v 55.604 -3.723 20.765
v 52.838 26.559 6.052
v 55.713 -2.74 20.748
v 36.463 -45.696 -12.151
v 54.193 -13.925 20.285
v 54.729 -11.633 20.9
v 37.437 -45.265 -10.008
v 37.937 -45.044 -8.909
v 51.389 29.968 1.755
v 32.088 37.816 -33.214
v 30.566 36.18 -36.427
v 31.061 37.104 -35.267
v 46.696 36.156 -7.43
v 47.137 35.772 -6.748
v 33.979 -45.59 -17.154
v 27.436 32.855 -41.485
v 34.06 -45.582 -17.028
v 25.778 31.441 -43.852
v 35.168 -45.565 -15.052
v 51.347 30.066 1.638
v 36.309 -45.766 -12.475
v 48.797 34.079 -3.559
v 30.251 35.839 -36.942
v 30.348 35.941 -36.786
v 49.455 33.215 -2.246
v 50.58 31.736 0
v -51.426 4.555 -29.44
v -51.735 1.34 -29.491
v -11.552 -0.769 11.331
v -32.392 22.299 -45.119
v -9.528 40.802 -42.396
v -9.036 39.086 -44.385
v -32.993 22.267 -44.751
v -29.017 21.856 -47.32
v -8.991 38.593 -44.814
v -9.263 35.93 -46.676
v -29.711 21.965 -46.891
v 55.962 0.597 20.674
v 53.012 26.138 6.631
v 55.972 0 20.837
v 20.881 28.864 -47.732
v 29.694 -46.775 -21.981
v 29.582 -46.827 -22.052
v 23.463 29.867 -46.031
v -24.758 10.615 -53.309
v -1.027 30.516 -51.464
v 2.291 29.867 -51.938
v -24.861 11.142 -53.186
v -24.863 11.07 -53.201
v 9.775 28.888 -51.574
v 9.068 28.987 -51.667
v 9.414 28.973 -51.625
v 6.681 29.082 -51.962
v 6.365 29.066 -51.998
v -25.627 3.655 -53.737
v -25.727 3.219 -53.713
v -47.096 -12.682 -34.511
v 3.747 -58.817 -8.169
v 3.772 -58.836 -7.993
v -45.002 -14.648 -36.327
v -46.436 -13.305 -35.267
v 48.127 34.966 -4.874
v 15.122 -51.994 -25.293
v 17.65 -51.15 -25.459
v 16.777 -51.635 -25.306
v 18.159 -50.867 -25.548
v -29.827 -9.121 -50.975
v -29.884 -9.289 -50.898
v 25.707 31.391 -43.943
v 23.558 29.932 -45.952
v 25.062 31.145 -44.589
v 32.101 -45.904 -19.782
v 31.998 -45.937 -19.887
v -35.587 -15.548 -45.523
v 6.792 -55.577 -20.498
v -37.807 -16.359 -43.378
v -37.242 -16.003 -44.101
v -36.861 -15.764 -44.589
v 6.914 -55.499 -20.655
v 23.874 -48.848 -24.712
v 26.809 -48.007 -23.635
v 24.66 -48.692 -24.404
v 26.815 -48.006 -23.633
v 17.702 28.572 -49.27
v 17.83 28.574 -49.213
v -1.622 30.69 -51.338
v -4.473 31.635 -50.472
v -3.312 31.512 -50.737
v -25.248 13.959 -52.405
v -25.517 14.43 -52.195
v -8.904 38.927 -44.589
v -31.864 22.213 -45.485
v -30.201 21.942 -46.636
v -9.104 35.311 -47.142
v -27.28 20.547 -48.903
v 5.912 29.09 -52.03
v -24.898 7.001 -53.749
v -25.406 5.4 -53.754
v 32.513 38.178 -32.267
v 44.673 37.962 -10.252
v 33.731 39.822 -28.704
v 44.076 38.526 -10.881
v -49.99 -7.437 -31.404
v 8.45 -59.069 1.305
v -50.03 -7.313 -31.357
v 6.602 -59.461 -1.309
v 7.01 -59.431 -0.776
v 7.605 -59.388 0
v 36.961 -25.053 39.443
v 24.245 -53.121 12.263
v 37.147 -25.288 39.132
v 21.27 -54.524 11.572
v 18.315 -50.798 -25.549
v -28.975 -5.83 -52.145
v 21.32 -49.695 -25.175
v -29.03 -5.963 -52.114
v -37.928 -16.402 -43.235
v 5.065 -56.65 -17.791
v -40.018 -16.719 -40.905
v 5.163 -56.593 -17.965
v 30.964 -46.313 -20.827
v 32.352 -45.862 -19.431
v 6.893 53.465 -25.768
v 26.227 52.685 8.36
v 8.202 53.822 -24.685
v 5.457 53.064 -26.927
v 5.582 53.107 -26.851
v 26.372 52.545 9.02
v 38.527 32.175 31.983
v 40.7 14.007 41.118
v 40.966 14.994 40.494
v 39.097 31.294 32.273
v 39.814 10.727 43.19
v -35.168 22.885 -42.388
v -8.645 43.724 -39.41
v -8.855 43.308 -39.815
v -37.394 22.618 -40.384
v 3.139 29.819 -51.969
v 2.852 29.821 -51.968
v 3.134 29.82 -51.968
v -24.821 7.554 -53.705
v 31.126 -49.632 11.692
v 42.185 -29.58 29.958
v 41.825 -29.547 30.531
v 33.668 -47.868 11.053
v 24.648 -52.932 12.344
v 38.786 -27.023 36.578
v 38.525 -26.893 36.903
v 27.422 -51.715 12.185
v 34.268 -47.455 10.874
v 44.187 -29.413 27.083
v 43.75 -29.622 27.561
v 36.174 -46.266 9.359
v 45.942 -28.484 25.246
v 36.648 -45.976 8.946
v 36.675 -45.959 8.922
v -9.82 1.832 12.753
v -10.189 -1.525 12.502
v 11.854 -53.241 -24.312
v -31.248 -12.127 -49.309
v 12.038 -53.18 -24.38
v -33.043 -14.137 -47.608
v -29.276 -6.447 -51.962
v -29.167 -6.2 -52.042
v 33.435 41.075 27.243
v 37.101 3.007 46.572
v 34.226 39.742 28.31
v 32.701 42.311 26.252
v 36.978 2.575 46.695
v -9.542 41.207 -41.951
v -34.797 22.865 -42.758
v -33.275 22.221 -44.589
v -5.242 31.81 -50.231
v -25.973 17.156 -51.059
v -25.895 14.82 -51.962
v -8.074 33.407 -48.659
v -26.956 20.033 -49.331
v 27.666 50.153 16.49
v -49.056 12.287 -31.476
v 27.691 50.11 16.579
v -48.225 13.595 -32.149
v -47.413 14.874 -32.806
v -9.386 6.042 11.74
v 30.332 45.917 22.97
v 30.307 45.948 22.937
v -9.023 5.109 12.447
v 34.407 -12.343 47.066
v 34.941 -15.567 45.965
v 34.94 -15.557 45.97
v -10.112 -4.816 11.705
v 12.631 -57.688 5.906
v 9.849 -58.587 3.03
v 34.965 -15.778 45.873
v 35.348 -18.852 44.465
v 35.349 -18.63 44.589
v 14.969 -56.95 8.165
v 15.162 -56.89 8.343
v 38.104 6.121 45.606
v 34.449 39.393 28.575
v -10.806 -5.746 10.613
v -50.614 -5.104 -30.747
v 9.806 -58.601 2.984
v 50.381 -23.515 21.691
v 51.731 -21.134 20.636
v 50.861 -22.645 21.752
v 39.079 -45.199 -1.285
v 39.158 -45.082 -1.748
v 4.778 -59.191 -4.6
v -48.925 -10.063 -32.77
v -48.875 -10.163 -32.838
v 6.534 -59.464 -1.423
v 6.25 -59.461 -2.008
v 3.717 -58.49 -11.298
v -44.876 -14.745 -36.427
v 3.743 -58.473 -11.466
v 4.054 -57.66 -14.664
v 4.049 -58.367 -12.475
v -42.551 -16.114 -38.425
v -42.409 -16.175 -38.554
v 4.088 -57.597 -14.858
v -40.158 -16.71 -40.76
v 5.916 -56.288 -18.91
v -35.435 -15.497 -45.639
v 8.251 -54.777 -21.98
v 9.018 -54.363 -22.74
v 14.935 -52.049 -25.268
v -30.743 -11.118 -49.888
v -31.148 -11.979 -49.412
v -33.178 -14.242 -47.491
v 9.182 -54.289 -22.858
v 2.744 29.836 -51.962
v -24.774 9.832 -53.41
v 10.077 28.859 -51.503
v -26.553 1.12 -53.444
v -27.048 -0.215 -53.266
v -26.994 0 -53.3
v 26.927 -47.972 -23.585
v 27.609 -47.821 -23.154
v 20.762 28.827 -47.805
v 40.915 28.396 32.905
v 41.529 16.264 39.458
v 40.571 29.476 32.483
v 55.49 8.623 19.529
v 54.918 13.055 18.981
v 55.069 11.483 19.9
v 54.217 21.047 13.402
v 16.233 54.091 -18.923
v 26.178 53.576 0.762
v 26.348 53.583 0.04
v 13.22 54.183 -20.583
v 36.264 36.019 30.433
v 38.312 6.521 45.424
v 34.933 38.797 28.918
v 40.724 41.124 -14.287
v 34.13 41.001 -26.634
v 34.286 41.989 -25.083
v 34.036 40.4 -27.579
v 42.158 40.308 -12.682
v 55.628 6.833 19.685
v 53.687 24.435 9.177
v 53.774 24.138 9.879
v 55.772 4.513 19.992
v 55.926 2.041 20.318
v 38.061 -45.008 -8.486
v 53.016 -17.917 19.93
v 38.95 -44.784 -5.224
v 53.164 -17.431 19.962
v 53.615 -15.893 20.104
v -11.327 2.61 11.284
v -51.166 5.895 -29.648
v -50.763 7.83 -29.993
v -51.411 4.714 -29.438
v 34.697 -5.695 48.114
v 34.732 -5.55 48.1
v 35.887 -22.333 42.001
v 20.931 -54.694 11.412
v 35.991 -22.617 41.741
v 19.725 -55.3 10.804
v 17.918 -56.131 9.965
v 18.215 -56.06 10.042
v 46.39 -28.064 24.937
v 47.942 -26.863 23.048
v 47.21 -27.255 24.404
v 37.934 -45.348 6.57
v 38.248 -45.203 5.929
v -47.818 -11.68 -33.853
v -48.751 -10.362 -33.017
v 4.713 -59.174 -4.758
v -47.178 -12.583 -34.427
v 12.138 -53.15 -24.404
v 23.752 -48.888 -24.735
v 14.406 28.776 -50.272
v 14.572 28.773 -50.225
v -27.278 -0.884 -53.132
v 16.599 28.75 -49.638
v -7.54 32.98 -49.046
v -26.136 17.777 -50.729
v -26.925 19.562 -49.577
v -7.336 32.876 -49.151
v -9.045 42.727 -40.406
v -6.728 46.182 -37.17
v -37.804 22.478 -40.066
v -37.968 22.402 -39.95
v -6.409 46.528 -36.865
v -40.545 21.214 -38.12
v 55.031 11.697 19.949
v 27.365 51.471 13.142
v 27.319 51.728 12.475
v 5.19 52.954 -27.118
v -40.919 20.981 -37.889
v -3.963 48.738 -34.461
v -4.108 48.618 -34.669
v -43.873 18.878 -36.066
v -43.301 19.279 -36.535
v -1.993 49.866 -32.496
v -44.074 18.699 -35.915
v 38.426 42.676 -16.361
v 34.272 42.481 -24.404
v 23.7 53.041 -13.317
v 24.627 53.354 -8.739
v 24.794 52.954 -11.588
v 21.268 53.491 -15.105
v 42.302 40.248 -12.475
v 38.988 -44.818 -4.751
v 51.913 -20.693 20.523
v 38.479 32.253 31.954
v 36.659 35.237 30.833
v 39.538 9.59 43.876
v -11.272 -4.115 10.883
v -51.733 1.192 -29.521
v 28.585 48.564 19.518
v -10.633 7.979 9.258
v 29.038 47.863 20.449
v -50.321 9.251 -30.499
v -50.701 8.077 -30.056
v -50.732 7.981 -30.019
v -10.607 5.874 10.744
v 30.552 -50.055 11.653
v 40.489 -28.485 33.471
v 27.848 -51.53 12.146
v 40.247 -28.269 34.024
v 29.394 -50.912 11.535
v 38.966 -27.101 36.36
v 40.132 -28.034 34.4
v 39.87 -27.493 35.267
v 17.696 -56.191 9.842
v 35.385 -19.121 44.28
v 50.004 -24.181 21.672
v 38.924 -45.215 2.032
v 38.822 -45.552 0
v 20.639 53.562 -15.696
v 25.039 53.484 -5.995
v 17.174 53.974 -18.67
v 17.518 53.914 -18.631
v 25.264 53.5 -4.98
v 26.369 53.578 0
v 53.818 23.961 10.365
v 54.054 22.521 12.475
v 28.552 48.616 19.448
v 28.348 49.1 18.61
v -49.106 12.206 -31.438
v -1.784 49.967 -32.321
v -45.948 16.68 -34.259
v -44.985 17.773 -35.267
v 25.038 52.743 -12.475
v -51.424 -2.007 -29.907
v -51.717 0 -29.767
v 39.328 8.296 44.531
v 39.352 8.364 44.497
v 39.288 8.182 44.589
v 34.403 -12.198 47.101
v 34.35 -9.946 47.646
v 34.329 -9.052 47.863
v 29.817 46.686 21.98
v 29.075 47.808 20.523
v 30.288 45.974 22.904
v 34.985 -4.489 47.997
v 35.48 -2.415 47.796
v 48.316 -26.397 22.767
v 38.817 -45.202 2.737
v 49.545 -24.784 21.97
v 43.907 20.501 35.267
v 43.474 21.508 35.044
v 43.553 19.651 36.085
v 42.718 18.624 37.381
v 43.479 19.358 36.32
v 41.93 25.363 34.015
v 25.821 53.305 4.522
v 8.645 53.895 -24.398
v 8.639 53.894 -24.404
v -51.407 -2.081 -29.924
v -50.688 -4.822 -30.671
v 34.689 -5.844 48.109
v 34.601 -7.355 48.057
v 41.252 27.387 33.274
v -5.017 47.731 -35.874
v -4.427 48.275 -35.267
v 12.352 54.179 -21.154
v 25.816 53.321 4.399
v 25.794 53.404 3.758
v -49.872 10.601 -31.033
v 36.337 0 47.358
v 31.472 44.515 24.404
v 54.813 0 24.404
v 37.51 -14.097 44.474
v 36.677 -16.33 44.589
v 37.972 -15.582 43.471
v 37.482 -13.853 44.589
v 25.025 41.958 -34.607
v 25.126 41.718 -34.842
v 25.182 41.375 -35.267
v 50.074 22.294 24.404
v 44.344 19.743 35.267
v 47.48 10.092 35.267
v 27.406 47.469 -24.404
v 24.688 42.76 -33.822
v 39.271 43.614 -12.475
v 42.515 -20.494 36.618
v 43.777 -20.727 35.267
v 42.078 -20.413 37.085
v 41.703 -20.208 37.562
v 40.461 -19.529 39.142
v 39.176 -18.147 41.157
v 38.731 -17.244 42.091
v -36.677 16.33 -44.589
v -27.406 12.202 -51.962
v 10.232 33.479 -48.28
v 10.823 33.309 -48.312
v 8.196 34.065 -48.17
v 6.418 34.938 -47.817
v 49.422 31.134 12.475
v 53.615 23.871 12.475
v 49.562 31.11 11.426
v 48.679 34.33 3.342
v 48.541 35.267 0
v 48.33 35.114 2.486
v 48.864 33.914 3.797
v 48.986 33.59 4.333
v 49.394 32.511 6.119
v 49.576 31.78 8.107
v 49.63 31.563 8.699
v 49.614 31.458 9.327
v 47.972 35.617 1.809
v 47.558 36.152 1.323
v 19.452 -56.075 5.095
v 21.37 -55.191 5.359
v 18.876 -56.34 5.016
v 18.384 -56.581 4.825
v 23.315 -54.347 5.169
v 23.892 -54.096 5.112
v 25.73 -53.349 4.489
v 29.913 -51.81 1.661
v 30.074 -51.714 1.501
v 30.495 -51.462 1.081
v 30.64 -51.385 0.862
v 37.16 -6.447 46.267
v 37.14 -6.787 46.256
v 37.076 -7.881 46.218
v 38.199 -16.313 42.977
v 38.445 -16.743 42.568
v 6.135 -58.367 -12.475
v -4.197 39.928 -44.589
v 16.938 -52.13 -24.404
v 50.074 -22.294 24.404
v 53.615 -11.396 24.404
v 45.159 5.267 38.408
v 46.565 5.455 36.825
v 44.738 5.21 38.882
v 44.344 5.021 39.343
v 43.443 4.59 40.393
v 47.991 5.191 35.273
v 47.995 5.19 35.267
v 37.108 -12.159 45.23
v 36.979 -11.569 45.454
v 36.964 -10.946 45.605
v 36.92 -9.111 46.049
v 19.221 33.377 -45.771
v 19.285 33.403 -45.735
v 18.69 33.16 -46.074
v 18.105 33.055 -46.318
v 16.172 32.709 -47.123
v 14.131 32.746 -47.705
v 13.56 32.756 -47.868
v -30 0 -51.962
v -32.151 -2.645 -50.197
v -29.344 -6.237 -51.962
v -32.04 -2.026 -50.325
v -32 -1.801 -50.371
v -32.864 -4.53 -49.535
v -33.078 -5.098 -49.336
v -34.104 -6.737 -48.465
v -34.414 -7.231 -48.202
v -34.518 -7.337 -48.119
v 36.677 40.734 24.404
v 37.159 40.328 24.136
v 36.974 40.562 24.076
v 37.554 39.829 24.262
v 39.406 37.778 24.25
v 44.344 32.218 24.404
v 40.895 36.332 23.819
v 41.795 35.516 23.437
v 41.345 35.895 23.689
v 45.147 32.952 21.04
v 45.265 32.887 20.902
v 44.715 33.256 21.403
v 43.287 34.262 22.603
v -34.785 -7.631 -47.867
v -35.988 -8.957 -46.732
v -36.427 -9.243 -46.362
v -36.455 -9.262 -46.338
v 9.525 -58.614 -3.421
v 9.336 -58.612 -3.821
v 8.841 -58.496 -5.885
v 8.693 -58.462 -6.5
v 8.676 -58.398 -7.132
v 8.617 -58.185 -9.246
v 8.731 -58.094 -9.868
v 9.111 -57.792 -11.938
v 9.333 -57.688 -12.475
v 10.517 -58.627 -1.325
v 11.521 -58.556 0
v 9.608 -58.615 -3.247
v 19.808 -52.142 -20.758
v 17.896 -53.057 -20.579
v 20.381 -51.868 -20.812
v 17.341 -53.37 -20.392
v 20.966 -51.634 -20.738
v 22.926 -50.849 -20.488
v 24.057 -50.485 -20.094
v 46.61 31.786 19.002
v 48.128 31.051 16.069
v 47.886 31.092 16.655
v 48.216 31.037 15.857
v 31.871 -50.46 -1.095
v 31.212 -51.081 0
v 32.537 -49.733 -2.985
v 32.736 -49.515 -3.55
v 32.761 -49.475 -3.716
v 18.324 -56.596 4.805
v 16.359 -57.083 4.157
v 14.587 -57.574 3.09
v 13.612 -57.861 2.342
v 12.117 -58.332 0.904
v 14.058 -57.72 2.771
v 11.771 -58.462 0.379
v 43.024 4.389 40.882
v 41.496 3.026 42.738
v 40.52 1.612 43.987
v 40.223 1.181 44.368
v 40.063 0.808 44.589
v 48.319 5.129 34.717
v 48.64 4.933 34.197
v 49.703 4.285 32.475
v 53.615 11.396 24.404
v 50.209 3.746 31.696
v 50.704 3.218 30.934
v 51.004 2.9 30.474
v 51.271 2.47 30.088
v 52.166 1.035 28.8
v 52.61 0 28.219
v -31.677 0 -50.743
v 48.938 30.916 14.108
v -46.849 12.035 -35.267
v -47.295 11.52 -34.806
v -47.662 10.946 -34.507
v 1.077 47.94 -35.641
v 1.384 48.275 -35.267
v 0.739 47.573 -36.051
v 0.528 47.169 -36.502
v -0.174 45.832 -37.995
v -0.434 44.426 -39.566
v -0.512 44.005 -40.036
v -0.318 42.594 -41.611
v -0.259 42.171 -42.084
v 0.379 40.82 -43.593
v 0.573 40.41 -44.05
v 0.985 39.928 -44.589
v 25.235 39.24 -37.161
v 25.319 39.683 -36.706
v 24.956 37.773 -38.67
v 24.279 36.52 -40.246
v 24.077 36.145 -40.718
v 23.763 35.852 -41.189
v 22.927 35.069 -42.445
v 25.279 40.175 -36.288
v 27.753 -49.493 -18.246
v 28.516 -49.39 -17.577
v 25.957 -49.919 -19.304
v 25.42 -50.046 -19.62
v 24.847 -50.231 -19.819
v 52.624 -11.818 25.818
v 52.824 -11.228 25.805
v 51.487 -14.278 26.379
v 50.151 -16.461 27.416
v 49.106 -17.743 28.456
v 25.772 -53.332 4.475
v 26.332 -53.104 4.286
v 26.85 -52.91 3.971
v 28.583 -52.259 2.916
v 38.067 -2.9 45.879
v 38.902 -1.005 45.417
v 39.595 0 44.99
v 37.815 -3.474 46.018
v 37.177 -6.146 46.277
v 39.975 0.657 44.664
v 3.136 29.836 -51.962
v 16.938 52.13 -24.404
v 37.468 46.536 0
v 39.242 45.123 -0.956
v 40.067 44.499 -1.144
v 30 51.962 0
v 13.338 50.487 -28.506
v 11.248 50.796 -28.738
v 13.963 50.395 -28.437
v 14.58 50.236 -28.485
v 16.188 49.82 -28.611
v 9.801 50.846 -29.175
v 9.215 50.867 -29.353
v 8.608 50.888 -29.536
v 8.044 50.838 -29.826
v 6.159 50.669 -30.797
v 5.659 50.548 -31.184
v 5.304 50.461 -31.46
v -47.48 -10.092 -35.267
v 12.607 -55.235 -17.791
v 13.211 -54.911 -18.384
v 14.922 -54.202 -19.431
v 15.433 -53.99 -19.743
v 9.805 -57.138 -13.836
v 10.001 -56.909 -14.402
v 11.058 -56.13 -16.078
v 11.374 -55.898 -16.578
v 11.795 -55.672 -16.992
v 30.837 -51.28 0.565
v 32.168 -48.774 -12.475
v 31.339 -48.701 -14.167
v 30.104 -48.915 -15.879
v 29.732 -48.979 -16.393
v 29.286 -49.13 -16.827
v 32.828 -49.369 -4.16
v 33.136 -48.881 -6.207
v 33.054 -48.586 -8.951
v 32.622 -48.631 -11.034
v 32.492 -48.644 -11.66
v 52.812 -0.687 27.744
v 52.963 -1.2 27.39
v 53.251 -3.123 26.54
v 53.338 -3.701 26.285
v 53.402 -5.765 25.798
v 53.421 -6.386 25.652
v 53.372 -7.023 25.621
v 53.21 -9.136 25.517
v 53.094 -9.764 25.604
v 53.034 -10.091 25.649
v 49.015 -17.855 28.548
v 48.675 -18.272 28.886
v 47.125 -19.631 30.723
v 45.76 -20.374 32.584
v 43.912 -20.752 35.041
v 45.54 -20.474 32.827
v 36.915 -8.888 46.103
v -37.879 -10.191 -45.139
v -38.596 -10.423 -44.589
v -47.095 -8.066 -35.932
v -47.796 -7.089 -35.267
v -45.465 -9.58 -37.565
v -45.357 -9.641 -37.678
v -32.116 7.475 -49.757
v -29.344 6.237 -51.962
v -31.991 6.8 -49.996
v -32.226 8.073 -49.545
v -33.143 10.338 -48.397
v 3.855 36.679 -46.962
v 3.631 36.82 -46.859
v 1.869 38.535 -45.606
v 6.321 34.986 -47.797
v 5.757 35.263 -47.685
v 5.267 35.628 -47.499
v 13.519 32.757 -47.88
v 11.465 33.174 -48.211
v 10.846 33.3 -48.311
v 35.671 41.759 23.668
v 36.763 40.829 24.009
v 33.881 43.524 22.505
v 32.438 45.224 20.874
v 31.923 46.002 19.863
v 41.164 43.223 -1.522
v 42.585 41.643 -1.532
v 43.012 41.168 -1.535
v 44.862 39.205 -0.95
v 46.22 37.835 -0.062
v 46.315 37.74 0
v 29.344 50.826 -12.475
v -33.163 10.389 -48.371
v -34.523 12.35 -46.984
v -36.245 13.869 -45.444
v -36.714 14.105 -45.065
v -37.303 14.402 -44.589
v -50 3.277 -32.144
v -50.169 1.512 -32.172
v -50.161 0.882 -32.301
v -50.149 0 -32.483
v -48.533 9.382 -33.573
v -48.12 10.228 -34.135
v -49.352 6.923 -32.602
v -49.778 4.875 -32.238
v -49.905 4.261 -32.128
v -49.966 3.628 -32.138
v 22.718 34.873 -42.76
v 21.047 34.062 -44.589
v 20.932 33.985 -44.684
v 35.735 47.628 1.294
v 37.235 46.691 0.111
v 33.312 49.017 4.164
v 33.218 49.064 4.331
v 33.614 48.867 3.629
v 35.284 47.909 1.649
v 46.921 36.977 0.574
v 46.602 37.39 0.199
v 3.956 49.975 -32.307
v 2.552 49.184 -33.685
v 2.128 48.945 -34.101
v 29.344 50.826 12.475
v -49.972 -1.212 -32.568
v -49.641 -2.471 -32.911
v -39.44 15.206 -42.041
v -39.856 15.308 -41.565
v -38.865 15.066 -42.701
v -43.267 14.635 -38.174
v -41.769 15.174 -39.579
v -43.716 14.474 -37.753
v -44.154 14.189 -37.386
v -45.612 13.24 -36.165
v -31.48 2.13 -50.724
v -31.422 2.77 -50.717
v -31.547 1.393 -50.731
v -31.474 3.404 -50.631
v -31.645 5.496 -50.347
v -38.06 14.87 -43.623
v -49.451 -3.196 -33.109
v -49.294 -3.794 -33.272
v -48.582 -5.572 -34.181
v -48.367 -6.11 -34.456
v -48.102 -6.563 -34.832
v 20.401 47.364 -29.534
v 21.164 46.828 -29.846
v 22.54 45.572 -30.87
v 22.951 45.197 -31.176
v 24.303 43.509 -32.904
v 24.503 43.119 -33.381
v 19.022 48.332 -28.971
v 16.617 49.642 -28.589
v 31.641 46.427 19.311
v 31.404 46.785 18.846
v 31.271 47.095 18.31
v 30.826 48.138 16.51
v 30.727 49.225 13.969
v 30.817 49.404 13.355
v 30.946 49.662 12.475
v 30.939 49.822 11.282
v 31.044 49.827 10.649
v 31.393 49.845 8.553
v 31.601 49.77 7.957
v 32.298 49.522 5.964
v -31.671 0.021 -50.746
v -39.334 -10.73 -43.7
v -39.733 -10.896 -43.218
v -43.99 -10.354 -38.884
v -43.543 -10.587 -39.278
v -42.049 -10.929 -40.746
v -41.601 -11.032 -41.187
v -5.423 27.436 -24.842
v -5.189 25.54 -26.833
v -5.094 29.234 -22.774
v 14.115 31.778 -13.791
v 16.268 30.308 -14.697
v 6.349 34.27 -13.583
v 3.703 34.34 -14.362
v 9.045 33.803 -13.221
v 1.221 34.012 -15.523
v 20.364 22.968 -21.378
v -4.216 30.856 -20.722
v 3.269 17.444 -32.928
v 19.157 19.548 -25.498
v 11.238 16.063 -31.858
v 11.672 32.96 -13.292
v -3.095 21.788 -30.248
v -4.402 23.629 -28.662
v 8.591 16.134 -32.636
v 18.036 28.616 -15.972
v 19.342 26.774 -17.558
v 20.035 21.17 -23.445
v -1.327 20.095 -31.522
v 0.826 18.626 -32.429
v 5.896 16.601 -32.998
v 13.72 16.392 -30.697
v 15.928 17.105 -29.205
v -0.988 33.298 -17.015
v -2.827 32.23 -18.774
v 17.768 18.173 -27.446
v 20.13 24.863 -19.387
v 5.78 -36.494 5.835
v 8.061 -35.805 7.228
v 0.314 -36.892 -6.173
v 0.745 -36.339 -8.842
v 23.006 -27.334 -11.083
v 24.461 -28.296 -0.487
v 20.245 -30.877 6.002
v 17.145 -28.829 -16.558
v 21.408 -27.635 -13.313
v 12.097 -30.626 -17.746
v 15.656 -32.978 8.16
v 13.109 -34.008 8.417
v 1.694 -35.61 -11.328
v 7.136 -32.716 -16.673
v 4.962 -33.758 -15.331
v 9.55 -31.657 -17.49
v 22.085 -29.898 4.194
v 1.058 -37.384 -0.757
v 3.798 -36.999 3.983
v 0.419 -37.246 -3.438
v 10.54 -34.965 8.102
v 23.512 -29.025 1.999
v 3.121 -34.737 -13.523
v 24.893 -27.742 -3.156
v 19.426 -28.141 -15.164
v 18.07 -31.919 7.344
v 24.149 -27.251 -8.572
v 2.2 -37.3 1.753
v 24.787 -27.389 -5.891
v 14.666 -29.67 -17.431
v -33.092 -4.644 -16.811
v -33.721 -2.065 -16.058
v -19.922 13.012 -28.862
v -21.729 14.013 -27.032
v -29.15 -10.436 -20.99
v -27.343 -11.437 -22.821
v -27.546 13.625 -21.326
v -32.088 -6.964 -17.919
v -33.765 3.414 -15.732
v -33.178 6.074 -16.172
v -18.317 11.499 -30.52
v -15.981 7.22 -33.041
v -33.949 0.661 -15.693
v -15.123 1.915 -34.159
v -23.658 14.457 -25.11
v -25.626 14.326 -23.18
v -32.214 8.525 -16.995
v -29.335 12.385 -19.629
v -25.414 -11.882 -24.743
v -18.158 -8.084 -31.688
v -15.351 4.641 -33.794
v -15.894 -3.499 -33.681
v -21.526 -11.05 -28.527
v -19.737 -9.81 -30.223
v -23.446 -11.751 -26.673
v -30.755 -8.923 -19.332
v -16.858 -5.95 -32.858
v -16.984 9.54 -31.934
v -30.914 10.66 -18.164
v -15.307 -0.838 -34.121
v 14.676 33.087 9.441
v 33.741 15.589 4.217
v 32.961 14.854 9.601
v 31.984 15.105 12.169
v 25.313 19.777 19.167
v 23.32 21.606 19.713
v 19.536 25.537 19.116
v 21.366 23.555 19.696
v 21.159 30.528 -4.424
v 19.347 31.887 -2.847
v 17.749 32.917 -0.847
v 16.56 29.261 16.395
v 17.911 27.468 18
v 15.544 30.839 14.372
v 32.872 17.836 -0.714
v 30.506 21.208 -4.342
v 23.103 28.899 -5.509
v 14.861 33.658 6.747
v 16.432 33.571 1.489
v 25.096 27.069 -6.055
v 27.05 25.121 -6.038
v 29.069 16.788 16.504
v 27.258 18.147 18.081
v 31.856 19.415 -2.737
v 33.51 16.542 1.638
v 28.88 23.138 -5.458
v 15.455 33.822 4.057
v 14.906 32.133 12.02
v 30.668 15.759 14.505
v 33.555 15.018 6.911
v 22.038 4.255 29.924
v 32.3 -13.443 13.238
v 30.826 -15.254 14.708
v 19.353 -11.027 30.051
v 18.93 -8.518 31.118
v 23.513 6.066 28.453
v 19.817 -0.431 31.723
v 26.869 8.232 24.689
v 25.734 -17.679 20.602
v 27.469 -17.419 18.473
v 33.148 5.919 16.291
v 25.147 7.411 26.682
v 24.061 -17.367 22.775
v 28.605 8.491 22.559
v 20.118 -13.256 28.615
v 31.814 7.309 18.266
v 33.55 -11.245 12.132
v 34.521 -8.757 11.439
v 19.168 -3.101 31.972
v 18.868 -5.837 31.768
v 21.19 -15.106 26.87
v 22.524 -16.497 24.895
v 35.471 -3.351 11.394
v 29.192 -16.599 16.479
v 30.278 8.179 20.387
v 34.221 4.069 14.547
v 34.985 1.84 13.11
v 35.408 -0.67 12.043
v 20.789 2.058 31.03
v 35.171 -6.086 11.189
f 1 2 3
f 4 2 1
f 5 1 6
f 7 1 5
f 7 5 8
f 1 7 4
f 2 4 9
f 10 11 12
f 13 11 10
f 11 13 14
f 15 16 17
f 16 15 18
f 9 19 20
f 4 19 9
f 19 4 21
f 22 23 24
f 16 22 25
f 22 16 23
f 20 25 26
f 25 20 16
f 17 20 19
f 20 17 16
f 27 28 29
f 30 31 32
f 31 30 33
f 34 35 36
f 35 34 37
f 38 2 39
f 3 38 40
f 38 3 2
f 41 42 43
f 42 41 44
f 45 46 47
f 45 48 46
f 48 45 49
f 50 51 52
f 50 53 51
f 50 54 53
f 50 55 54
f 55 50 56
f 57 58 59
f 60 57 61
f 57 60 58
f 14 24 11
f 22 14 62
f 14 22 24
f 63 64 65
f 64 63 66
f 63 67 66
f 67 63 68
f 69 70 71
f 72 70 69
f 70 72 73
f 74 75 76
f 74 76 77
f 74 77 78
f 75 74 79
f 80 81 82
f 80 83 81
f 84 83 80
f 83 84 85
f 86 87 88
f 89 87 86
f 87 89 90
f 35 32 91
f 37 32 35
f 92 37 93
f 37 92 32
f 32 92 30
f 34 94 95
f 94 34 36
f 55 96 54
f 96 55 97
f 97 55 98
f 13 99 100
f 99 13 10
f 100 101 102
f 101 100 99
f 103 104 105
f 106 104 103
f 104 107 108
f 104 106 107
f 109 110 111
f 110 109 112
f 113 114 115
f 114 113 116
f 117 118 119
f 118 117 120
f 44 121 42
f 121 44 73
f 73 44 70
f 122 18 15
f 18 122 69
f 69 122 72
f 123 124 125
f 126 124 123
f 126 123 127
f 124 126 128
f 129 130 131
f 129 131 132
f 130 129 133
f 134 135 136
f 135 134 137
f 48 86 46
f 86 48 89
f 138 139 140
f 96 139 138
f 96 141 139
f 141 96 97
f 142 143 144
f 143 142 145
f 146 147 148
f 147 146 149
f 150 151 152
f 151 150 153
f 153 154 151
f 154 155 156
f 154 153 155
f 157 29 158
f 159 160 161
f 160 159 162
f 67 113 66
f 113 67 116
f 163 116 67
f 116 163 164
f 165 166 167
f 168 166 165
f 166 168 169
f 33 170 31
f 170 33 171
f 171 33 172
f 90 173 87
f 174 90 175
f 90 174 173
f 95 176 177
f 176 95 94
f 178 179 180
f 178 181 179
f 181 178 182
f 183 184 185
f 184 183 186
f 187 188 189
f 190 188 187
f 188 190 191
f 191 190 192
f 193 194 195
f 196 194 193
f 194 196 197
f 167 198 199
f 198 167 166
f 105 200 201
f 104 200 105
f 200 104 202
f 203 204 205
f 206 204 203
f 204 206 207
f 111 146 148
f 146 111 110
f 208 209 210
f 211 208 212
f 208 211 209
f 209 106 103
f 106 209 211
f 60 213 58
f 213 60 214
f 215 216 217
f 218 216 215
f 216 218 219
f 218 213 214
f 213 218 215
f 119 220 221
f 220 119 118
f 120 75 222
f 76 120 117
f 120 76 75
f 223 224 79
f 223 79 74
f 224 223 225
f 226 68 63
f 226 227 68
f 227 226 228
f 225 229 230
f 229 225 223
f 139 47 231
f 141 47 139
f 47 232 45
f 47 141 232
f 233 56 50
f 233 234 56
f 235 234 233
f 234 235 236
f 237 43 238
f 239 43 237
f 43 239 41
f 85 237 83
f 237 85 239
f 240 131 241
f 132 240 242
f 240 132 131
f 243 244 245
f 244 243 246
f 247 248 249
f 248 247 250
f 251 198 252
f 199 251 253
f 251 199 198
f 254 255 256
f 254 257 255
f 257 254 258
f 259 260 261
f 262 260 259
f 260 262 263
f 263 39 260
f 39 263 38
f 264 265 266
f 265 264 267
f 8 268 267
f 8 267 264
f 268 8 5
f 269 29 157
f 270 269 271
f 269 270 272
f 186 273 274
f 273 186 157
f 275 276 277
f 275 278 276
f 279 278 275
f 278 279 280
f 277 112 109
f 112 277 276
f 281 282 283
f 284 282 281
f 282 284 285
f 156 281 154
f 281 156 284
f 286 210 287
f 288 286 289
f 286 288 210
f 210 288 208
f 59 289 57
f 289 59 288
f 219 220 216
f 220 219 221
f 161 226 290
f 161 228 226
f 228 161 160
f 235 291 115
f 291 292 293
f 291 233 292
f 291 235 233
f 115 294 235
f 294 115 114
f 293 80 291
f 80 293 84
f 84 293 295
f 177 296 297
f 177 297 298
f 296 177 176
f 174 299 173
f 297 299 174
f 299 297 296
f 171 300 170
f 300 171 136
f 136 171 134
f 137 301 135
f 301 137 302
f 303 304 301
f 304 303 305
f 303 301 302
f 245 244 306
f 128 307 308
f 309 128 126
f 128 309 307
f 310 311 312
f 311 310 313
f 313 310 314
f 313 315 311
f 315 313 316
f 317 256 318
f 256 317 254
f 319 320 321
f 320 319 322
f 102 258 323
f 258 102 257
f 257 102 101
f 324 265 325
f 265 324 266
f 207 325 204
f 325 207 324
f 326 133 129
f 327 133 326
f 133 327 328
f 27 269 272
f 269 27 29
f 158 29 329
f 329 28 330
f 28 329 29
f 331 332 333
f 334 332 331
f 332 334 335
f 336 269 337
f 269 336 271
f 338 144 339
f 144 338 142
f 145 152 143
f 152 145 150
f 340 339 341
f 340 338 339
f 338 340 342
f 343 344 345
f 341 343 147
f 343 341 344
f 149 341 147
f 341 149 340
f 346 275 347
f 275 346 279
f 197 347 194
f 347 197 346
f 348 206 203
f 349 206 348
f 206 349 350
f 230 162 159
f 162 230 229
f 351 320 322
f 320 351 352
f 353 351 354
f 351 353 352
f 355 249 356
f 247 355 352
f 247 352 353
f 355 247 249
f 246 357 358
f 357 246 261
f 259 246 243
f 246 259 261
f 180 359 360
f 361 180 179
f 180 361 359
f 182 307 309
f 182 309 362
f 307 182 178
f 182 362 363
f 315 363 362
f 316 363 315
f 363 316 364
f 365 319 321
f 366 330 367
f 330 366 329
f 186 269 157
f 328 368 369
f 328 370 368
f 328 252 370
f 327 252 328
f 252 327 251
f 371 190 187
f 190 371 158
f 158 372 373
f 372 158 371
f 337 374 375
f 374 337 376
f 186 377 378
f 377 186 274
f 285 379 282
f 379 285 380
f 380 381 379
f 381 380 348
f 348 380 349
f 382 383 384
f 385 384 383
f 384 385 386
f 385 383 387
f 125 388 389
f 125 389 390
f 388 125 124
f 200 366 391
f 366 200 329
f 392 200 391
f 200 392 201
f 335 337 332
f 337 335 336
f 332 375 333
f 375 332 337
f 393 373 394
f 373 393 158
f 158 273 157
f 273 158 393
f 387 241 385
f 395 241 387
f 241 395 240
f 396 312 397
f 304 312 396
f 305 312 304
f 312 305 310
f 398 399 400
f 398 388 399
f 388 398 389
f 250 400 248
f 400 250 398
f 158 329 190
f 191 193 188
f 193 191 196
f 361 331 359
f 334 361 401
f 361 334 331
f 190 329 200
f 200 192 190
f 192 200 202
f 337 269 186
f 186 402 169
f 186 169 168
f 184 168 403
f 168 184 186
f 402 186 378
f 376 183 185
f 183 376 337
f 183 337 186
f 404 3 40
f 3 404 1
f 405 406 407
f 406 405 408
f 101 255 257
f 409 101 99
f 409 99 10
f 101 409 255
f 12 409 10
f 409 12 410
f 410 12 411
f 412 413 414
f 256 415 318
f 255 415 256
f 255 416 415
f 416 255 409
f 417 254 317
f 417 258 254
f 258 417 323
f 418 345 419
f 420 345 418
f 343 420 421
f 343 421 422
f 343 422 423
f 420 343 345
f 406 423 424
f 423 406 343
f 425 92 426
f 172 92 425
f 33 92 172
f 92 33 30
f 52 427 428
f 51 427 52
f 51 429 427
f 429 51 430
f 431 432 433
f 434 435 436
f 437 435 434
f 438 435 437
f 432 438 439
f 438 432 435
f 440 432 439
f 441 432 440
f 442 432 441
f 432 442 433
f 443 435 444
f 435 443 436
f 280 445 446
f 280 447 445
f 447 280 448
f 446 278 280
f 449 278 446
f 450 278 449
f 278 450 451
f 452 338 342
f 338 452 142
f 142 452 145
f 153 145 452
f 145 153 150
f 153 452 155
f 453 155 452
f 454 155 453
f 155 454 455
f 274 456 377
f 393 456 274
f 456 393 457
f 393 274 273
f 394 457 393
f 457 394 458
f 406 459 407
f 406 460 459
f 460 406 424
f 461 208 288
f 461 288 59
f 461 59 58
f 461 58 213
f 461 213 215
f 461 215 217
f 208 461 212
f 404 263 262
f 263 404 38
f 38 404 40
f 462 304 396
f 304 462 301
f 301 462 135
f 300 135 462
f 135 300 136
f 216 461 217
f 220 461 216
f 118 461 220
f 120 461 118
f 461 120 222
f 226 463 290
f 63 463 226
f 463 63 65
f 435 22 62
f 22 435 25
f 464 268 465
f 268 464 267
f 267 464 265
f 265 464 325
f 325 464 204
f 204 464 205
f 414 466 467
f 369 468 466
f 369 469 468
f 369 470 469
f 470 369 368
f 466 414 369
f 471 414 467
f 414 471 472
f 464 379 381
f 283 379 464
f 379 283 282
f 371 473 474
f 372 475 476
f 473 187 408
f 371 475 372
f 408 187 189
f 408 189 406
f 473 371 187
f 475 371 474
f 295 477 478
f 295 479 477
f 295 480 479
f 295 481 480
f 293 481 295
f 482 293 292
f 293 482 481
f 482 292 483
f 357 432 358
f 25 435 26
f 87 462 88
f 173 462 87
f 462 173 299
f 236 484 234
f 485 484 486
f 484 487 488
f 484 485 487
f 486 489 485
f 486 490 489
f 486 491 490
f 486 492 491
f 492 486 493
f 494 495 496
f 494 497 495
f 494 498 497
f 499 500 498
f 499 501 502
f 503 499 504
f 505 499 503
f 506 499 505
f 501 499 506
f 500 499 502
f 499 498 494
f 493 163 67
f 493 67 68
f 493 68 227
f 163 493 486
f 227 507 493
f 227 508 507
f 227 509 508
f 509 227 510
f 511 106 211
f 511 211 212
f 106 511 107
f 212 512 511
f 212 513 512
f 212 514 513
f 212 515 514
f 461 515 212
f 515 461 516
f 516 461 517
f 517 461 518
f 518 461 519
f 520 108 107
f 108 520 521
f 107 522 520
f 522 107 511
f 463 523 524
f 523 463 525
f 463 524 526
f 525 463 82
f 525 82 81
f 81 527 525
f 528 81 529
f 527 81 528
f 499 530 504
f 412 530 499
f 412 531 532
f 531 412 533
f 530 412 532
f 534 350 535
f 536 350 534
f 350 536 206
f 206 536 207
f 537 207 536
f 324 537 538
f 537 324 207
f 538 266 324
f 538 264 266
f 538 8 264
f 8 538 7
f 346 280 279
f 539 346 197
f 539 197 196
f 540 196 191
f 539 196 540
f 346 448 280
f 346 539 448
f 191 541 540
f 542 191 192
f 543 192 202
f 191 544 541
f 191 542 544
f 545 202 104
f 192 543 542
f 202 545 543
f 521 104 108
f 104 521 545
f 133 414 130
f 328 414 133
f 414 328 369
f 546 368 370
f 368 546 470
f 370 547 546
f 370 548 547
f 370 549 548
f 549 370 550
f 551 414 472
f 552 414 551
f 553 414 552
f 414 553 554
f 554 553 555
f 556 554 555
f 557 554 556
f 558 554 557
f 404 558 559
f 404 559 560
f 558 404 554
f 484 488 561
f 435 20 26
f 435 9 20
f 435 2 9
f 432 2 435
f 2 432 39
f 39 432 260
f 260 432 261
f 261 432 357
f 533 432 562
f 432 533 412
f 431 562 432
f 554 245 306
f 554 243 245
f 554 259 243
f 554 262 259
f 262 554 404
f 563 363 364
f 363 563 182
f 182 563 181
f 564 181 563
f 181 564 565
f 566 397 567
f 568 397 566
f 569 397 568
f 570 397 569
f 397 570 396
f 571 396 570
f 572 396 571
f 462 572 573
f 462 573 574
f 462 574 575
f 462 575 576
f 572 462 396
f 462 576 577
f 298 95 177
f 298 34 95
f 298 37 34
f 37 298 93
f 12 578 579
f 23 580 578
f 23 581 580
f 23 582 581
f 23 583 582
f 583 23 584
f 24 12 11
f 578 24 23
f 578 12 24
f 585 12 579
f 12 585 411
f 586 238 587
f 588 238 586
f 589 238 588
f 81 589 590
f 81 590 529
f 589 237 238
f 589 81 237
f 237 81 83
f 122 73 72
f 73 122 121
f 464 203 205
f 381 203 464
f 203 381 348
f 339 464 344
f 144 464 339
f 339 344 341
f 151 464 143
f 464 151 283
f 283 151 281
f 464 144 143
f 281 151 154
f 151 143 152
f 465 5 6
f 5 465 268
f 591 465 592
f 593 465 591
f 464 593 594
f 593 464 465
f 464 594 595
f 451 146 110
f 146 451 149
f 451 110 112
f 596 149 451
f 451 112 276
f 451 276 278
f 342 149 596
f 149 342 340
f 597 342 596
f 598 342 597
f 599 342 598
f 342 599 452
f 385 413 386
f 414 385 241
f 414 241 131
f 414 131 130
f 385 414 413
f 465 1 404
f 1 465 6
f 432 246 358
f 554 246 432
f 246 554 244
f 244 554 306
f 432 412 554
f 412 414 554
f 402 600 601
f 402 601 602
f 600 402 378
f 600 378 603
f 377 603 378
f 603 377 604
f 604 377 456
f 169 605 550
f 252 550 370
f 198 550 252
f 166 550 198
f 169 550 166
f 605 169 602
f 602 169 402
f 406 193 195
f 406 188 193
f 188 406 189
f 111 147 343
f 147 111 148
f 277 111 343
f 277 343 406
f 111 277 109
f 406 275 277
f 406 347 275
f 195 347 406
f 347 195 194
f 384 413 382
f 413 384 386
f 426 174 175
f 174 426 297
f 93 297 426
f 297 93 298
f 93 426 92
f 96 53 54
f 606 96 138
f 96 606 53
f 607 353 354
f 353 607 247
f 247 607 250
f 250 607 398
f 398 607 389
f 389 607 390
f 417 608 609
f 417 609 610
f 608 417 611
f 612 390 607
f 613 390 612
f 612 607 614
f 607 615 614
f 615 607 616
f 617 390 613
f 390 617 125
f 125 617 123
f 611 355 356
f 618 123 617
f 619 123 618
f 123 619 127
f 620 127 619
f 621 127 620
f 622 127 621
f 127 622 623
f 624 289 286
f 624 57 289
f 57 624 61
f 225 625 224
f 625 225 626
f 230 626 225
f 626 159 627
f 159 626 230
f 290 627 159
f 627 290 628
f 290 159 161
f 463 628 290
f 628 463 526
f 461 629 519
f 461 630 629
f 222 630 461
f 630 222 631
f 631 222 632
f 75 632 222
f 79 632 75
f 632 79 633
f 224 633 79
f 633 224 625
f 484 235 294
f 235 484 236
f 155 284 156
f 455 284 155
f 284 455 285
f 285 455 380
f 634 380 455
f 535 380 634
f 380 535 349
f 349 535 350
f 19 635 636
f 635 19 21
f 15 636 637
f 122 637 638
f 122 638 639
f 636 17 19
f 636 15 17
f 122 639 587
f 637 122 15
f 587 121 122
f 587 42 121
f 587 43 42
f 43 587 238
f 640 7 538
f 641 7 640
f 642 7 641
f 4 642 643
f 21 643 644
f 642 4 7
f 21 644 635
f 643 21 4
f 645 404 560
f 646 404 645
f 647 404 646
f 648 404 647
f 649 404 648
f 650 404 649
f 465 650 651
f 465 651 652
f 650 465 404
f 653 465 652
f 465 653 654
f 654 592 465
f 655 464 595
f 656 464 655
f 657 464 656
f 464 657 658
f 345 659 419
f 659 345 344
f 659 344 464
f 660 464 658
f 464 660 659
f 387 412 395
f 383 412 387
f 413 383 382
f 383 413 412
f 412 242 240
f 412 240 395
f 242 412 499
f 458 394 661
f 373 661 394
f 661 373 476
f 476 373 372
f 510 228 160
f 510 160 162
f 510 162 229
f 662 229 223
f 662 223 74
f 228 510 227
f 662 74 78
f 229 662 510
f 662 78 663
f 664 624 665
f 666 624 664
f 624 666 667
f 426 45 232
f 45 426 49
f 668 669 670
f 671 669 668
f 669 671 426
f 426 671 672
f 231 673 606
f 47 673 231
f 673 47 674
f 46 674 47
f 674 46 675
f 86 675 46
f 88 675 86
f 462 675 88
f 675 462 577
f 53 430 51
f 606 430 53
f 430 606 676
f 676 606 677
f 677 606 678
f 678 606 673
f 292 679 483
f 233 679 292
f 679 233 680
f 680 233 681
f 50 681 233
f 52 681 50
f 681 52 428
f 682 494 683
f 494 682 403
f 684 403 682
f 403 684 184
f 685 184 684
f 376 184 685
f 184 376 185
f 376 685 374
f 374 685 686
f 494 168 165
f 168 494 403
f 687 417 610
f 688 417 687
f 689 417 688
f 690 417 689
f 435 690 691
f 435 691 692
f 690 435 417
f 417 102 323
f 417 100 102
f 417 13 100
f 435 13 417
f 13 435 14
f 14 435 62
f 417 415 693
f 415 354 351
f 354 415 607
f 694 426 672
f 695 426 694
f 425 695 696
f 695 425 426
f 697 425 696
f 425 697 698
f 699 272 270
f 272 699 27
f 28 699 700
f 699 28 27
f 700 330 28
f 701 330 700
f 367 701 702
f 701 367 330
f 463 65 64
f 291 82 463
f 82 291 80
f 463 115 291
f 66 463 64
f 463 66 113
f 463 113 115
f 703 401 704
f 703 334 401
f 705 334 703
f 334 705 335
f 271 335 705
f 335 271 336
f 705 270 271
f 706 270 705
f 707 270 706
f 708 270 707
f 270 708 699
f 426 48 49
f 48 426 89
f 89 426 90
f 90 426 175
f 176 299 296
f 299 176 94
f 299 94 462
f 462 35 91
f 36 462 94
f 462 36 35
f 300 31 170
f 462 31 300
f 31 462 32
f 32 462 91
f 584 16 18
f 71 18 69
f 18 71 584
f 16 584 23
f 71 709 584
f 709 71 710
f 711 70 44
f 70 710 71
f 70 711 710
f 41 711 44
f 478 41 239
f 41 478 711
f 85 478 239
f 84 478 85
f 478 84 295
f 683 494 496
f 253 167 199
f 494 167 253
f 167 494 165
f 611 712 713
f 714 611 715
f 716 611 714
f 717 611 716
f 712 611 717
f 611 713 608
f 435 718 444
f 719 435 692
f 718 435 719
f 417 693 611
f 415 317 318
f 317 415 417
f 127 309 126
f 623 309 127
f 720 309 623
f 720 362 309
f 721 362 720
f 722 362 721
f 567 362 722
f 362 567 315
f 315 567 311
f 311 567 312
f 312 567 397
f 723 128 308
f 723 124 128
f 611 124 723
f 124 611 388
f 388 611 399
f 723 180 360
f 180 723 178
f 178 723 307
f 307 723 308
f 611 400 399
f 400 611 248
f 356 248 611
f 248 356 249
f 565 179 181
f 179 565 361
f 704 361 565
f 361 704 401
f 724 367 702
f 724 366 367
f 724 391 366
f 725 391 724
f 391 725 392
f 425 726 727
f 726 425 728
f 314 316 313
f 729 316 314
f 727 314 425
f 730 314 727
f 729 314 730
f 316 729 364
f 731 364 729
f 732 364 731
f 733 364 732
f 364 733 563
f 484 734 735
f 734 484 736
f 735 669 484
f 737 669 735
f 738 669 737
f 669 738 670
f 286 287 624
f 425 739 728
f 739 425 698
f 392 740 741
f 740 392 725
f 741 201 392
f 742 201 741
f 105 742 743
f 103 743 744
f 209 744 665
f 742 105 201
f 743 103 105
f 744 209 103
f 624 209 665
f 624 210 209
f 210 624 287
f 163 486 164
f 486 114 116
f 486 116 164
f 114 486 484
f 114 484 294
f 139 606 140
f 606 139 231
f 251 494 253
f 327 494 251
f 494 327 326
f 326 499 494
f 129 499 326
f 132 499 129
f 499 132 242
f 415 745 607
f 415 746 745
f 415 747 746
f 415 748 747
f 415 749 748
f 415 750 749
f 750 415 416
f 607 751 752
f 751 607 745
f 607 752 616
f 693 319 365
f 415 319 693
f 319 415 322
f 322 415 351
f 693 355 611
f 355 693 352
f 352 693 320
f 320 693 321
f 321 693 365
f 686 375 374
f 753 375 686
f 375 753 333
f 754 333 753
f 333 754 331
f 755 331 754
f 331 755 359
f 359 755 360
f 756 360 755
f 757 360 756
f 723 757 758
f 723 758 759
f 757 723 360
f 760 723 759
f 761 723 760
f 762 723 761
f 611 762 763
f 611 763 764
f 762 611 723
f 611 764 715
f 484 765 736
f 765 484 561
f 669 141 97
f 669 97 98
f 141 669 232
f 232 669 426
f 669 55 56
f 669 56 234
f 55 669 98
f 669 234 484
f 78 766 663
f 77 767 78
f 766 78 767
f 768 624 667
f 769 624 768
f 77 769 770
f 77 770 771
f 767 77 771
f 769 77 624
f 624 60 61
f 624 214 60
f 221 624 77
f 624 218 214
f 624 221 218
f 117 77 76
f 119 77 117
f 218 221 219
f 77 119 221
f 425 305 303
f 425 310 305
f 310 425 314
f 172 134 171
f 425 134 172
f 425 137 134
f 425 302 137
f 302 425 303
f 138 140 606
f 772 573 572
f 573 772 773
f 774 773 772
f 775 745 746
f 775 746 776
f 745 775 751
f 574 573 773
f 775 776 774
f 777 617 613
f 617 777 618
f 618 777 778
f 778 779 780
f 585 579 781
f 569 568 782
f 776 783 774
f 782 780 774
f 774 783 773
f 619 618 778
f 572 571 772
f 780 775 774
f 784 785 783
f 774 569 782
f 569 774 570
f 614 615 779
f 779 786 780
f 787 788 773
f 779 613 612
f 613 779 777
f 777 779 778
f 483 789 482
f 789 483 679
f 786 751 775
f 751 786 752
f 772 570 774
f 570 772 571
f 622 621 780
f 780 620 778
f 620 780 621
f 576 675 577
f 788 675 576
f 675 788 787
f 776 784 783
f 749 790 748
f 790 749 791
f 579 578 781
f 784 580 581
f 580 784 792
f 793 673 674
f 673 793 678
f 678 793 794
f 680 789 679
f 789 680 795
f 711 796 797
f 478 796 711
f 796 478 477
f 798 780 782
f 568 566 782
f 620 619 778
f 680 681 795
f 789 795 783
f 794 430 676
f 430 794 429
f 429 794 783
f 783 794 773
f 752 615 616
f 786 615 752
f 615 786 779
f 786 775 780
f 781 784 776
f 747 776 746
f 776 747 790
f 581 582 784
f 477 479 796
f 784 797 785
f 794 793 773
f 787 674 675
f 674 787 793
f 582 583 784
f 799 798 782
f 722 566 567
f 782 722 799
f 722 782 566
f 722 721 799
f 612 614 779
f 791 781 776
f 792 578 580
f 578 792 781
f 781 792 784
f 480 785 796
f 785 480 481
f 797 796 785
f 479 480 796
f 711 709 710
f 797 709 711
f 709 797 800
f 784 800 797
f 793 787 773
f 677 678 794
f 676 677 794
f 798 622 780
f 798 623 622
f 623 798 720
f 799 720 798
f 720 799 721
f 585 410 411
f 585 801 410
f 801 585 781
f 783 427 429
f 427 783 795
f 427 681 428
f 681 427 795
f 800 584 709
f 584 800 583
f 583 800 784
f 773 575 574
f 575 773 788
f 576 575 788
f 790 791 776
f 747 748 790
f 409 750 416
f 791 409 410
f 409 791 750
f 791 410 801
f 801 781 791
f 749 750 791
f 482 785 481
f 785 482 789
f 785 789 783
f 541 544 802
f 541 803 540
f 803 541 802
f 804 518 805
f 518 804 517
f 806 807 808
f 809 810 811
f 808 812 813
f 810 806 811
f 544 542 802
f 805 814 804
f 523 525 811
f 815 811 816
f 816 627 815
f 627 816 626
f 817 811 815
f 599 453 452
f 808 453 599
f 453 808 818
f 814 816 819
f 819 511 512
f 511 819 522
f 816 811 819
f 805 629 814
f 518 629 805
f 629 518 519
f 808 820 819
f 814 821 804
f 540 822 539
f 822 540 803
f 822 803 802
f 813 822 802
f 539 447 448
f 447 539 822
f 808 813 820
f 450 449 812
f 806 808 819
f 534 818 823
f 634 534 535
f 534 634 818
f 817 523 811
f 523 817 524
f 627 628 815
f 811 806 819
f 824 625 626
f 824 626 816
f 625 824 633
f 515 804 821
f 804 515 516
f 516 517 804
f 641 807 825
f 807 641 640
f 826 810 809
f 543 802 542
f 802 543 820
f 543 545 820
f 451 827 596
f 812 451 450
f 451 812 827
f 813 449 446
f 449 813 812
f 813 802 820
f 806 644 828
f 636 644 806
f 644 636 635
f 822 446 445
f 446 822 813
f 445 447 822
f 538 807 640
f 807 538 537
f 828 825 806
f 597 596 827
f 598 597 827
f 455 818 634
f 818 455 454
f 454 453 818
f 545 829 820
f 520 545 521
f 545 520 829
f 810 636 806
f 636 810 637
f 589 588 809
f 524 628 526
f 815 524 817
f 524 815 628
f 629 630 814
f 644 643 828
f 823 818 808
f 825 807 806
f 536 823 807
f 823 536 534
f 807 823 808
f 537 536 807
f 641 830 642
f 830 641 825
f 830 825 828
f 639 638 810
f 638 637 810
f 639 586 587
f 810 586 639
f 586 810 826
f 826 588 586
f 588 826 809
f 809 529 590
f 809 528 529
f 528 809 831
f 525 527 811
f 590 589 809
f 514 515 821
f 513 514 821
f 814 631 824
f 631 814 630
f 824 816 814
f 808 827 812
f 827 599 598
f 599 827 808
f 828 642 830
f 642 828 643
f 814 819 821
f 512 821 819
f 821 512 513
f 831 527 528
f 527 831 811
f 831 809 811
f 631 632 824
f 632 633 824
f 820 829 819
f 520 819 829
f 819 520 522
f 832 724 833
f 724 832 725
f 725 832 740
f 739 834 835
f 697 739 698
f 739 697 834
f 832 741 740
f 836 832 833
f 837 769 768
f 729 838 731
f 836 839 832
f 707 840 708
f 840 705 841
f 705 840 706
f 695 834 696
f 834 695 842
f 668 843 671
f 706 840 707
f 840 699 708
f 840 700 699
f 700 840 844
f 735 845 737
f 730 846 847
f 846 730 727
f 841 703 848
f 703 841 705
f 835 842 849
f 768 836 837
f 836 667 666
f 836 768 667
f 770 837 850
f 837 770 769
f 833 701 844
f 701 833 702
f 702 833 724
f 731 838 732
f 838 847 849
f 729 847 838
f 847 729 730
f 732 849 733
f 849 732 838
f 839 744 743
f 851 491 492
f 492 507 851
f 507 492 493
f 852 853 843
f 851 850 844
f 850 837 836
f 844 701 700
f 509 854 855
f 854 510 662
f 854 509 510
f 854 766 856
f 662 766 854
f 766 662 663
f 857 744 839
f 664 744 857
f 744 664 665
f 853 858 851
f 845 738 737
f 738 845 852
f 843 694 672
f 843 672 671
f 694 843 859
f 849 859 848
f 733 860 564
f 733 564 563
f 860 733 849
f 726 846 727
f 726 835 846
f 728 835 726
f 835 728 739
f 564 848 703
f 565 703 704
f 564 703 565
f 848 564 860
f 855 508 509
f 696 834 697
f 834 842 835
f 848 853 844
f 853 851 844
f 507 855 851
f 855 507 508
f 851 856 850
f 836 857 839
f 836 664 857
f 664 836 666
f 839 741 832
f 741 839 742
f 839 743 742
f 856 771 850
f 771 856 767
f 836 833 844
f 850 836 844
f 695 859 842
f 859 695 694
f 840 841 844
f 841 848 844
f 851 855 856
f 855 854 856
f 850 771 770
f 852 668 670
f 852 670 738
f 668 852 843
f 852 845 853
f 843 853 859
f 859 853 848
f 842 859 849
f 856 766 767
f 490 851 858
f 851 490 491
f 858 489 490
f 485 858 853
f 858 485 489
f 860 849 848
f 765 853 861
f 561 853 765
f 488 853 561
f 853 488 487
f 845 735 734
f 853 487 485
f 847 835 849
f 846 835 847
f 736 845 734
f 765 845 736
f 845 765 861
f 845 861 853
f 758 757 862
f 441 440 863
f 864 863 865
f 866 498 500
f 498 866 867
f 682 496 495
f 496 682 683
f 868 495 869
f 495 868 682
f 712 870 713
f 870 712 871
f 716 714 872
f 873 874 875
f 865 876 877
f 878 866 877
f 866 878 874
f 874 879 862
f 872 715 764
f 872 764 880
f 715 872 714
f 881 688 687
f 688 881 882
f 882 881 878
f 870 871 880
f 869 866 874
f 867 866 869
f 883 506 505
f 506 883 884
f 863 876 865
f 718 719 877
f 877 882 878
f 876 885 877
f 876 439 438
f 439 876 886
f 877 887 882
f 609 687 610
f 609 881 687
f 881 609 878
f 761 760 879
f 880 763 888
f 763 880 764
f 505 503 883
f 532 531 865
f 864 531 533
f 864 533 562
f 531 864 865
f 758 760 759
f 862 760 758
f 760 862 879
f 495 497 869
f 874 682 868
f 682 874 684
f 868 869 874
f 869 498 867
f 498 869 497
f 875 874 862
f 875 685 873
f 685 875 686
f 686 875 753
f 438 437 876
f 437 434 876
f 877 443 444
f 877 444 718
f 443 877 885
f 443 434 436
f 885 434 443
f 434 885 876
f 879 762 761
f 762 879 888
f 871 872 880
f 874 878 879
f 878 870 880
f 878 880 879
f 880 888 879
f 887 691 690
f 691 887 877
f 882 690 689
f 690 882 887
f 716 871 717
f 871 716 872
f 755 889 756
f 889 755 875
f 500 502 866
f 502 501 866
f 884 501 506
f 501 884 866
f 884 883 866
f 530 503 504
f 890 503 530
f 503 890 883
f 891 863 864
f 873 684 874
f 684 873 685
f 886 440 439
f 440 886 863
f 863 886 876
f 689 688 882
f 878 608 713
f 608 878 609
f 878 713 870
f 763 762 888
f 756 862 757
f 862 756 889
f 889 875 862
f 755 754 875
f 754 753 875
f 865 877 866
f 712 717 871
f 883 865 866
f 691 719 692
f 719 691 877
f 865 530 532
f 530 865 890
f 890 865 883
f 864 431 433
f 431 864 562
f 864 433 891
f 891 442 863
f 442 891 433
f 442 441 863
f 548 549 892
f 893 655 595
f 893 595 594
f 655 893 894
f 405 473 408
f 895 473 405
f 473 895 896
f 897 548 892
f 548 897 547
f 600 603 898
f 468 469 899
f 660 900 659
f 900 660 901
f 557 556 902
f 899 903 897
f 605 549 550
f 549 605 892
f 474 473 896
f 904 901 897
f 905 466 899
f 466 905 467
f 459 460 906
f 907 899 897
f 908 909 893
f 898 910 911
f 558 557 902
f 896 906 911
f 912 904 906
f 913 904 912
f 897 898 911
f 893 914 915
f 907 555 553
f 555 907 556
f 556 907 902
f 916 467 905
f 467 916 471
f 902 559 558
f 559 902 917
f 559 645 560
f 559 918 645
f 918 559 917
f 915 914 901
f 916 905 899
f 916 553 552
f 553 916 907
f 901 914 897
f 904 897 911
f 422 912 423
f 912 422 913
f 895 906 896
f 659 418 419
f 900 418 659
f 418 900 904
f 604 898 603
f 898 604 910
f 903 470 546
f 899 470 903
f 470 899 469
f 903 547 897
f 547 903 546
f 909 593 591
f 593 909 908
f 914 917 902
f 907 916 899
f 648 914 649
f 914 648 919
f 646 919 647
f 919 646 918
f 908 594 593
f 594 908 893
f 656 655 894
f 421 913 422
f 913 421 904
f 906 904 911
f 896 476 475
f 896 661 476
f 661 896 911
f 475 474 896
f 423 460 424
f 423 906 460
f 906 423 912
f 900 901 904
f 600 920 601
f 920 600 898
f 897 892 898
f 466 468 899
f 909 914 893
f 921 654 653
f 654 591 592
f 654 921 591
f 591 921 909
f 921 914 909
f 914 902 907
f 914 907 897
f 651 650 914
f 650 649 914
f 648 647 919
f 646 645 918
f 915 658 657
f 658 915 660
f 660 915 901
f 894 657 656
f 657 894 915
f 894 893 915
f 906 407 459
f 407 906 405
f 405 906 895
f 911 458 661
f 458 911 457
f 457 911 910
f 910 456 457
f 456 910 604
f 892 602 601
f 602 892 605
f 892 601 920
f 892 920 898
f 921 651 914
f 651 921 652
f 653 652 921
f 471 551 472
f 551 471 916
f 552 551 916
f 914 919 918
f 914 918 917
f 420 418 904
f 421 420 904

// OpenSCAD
difference() {
	intersection() {
		hull() {
			rotate(a = -121.8002487075, v = [-0.2416956723, 0.8147986889, 0.0000000000]) {
				rotate(a = -90.0000000000, v = [0.3826834324, 0.9238795325, -0.0000000000]) {
					cylinder(h = 60, r = 16.2000000000);
				}
			}
			rotate(a = -121.8002487075, v = [-0.2416956723, 0.8147986889, 0.0000000000]) {
				rotate(a = -90.0000000000, v = [-0.9914448614, -0.1305261922, 0.0000000000]) {
					cylinder(h = 60, r = 16.2000000000);
				}
			}
			rotate(a = -121.8002487075, v = [-0.2416956723, 0.8147986889, 0.0000000000]) {
				rotate(a = -20.3482733305, v = [0.1519712042, 0.3127585874, -0.0000000000]) {
					cylinder(h = 60, r = 16.2000000000);
				}
			}
			rotate(a = -121.8002487075, v = [-0.2416956723, 0.8147986889, 0.0000000000]) {
				rotate(a = -146.5585275075, v = [0.3687026260, 0.4095765180, -0.0000000000]) {
					cylinder(h = 60, r = 16.2000000000);
				}
			}
			rotate(a = -121.8002487075, v = [-0.2416956723, 0.8147986889, 0.0000000000]) {
				rotate(a = -157.7736717199, v = [-0.2891837505, -0.2438402662, 0.0000000000]) {
					cylinder(h = 60, r = 16.2000000000);
				}
			}
		}
		sphere(r = 60);
	}
	union() {
		rotate(a = -121.8002487075, v = [-0.2416956723, 0.8147986889, 0.0000000000]) {
			rotate(a = -90.0000000000, v = [0.3826834324, 0.9238795325, -0.0000000000]) {
				translate(v = [0, 0, 35]) {
					cylinder(h = 100, r = 13.2000000000);
				}
			}
		}
		rotate(a = -121.8002487075, v = [-0.2416956723, 0.8147986889, 0.0000000000]) {
			rotate(a = -90.0000000000, v = [-0.9914448614, -0.1305261922, 0.0000000000]) {
				translate(v = [0, 0, 35]) {
					cylinder(h = 100, r = 13.2000000000);
				}
			}
		}
		rotate(a = -121.8002487075, v = [-0.2416956723, 0.8147986889, 0.0000000000]) {
			rotate(a = -20.3482733305, v = [0.1519712042, 0.3127585874, -0.0000000000]) {
				translate(v = [0, 0, 35]) {
					cylinder(h = 100, r = 13.2000000000);
				}
			}
		}
		rotate(a = -121.8002487075, v = [-0.2416956723, 0.8147986889, 0.0000000000]) {
			rotate(a = -146.5585275075, v = [0.3687026260, 0.4095765180, -0.0000000000]) {
				translate(v = [0, 0, 35]) {
					cylinder(h = 100, r = 13.2000000000);
				}
			}
		}
		rotate(a = -121.8002487075, v = [-0.2416956723, 0.8147986889, 0.0000000000]) {
			rotate(a = -157.7736717199, v = [-0.2891837505, -0.2438402662, 0.0000000000]) {
				translate(v = [0, 0, 35]) {
					cylinder(h = 100, r = 13.2000000000);
				}
			}
		}
	}
}
